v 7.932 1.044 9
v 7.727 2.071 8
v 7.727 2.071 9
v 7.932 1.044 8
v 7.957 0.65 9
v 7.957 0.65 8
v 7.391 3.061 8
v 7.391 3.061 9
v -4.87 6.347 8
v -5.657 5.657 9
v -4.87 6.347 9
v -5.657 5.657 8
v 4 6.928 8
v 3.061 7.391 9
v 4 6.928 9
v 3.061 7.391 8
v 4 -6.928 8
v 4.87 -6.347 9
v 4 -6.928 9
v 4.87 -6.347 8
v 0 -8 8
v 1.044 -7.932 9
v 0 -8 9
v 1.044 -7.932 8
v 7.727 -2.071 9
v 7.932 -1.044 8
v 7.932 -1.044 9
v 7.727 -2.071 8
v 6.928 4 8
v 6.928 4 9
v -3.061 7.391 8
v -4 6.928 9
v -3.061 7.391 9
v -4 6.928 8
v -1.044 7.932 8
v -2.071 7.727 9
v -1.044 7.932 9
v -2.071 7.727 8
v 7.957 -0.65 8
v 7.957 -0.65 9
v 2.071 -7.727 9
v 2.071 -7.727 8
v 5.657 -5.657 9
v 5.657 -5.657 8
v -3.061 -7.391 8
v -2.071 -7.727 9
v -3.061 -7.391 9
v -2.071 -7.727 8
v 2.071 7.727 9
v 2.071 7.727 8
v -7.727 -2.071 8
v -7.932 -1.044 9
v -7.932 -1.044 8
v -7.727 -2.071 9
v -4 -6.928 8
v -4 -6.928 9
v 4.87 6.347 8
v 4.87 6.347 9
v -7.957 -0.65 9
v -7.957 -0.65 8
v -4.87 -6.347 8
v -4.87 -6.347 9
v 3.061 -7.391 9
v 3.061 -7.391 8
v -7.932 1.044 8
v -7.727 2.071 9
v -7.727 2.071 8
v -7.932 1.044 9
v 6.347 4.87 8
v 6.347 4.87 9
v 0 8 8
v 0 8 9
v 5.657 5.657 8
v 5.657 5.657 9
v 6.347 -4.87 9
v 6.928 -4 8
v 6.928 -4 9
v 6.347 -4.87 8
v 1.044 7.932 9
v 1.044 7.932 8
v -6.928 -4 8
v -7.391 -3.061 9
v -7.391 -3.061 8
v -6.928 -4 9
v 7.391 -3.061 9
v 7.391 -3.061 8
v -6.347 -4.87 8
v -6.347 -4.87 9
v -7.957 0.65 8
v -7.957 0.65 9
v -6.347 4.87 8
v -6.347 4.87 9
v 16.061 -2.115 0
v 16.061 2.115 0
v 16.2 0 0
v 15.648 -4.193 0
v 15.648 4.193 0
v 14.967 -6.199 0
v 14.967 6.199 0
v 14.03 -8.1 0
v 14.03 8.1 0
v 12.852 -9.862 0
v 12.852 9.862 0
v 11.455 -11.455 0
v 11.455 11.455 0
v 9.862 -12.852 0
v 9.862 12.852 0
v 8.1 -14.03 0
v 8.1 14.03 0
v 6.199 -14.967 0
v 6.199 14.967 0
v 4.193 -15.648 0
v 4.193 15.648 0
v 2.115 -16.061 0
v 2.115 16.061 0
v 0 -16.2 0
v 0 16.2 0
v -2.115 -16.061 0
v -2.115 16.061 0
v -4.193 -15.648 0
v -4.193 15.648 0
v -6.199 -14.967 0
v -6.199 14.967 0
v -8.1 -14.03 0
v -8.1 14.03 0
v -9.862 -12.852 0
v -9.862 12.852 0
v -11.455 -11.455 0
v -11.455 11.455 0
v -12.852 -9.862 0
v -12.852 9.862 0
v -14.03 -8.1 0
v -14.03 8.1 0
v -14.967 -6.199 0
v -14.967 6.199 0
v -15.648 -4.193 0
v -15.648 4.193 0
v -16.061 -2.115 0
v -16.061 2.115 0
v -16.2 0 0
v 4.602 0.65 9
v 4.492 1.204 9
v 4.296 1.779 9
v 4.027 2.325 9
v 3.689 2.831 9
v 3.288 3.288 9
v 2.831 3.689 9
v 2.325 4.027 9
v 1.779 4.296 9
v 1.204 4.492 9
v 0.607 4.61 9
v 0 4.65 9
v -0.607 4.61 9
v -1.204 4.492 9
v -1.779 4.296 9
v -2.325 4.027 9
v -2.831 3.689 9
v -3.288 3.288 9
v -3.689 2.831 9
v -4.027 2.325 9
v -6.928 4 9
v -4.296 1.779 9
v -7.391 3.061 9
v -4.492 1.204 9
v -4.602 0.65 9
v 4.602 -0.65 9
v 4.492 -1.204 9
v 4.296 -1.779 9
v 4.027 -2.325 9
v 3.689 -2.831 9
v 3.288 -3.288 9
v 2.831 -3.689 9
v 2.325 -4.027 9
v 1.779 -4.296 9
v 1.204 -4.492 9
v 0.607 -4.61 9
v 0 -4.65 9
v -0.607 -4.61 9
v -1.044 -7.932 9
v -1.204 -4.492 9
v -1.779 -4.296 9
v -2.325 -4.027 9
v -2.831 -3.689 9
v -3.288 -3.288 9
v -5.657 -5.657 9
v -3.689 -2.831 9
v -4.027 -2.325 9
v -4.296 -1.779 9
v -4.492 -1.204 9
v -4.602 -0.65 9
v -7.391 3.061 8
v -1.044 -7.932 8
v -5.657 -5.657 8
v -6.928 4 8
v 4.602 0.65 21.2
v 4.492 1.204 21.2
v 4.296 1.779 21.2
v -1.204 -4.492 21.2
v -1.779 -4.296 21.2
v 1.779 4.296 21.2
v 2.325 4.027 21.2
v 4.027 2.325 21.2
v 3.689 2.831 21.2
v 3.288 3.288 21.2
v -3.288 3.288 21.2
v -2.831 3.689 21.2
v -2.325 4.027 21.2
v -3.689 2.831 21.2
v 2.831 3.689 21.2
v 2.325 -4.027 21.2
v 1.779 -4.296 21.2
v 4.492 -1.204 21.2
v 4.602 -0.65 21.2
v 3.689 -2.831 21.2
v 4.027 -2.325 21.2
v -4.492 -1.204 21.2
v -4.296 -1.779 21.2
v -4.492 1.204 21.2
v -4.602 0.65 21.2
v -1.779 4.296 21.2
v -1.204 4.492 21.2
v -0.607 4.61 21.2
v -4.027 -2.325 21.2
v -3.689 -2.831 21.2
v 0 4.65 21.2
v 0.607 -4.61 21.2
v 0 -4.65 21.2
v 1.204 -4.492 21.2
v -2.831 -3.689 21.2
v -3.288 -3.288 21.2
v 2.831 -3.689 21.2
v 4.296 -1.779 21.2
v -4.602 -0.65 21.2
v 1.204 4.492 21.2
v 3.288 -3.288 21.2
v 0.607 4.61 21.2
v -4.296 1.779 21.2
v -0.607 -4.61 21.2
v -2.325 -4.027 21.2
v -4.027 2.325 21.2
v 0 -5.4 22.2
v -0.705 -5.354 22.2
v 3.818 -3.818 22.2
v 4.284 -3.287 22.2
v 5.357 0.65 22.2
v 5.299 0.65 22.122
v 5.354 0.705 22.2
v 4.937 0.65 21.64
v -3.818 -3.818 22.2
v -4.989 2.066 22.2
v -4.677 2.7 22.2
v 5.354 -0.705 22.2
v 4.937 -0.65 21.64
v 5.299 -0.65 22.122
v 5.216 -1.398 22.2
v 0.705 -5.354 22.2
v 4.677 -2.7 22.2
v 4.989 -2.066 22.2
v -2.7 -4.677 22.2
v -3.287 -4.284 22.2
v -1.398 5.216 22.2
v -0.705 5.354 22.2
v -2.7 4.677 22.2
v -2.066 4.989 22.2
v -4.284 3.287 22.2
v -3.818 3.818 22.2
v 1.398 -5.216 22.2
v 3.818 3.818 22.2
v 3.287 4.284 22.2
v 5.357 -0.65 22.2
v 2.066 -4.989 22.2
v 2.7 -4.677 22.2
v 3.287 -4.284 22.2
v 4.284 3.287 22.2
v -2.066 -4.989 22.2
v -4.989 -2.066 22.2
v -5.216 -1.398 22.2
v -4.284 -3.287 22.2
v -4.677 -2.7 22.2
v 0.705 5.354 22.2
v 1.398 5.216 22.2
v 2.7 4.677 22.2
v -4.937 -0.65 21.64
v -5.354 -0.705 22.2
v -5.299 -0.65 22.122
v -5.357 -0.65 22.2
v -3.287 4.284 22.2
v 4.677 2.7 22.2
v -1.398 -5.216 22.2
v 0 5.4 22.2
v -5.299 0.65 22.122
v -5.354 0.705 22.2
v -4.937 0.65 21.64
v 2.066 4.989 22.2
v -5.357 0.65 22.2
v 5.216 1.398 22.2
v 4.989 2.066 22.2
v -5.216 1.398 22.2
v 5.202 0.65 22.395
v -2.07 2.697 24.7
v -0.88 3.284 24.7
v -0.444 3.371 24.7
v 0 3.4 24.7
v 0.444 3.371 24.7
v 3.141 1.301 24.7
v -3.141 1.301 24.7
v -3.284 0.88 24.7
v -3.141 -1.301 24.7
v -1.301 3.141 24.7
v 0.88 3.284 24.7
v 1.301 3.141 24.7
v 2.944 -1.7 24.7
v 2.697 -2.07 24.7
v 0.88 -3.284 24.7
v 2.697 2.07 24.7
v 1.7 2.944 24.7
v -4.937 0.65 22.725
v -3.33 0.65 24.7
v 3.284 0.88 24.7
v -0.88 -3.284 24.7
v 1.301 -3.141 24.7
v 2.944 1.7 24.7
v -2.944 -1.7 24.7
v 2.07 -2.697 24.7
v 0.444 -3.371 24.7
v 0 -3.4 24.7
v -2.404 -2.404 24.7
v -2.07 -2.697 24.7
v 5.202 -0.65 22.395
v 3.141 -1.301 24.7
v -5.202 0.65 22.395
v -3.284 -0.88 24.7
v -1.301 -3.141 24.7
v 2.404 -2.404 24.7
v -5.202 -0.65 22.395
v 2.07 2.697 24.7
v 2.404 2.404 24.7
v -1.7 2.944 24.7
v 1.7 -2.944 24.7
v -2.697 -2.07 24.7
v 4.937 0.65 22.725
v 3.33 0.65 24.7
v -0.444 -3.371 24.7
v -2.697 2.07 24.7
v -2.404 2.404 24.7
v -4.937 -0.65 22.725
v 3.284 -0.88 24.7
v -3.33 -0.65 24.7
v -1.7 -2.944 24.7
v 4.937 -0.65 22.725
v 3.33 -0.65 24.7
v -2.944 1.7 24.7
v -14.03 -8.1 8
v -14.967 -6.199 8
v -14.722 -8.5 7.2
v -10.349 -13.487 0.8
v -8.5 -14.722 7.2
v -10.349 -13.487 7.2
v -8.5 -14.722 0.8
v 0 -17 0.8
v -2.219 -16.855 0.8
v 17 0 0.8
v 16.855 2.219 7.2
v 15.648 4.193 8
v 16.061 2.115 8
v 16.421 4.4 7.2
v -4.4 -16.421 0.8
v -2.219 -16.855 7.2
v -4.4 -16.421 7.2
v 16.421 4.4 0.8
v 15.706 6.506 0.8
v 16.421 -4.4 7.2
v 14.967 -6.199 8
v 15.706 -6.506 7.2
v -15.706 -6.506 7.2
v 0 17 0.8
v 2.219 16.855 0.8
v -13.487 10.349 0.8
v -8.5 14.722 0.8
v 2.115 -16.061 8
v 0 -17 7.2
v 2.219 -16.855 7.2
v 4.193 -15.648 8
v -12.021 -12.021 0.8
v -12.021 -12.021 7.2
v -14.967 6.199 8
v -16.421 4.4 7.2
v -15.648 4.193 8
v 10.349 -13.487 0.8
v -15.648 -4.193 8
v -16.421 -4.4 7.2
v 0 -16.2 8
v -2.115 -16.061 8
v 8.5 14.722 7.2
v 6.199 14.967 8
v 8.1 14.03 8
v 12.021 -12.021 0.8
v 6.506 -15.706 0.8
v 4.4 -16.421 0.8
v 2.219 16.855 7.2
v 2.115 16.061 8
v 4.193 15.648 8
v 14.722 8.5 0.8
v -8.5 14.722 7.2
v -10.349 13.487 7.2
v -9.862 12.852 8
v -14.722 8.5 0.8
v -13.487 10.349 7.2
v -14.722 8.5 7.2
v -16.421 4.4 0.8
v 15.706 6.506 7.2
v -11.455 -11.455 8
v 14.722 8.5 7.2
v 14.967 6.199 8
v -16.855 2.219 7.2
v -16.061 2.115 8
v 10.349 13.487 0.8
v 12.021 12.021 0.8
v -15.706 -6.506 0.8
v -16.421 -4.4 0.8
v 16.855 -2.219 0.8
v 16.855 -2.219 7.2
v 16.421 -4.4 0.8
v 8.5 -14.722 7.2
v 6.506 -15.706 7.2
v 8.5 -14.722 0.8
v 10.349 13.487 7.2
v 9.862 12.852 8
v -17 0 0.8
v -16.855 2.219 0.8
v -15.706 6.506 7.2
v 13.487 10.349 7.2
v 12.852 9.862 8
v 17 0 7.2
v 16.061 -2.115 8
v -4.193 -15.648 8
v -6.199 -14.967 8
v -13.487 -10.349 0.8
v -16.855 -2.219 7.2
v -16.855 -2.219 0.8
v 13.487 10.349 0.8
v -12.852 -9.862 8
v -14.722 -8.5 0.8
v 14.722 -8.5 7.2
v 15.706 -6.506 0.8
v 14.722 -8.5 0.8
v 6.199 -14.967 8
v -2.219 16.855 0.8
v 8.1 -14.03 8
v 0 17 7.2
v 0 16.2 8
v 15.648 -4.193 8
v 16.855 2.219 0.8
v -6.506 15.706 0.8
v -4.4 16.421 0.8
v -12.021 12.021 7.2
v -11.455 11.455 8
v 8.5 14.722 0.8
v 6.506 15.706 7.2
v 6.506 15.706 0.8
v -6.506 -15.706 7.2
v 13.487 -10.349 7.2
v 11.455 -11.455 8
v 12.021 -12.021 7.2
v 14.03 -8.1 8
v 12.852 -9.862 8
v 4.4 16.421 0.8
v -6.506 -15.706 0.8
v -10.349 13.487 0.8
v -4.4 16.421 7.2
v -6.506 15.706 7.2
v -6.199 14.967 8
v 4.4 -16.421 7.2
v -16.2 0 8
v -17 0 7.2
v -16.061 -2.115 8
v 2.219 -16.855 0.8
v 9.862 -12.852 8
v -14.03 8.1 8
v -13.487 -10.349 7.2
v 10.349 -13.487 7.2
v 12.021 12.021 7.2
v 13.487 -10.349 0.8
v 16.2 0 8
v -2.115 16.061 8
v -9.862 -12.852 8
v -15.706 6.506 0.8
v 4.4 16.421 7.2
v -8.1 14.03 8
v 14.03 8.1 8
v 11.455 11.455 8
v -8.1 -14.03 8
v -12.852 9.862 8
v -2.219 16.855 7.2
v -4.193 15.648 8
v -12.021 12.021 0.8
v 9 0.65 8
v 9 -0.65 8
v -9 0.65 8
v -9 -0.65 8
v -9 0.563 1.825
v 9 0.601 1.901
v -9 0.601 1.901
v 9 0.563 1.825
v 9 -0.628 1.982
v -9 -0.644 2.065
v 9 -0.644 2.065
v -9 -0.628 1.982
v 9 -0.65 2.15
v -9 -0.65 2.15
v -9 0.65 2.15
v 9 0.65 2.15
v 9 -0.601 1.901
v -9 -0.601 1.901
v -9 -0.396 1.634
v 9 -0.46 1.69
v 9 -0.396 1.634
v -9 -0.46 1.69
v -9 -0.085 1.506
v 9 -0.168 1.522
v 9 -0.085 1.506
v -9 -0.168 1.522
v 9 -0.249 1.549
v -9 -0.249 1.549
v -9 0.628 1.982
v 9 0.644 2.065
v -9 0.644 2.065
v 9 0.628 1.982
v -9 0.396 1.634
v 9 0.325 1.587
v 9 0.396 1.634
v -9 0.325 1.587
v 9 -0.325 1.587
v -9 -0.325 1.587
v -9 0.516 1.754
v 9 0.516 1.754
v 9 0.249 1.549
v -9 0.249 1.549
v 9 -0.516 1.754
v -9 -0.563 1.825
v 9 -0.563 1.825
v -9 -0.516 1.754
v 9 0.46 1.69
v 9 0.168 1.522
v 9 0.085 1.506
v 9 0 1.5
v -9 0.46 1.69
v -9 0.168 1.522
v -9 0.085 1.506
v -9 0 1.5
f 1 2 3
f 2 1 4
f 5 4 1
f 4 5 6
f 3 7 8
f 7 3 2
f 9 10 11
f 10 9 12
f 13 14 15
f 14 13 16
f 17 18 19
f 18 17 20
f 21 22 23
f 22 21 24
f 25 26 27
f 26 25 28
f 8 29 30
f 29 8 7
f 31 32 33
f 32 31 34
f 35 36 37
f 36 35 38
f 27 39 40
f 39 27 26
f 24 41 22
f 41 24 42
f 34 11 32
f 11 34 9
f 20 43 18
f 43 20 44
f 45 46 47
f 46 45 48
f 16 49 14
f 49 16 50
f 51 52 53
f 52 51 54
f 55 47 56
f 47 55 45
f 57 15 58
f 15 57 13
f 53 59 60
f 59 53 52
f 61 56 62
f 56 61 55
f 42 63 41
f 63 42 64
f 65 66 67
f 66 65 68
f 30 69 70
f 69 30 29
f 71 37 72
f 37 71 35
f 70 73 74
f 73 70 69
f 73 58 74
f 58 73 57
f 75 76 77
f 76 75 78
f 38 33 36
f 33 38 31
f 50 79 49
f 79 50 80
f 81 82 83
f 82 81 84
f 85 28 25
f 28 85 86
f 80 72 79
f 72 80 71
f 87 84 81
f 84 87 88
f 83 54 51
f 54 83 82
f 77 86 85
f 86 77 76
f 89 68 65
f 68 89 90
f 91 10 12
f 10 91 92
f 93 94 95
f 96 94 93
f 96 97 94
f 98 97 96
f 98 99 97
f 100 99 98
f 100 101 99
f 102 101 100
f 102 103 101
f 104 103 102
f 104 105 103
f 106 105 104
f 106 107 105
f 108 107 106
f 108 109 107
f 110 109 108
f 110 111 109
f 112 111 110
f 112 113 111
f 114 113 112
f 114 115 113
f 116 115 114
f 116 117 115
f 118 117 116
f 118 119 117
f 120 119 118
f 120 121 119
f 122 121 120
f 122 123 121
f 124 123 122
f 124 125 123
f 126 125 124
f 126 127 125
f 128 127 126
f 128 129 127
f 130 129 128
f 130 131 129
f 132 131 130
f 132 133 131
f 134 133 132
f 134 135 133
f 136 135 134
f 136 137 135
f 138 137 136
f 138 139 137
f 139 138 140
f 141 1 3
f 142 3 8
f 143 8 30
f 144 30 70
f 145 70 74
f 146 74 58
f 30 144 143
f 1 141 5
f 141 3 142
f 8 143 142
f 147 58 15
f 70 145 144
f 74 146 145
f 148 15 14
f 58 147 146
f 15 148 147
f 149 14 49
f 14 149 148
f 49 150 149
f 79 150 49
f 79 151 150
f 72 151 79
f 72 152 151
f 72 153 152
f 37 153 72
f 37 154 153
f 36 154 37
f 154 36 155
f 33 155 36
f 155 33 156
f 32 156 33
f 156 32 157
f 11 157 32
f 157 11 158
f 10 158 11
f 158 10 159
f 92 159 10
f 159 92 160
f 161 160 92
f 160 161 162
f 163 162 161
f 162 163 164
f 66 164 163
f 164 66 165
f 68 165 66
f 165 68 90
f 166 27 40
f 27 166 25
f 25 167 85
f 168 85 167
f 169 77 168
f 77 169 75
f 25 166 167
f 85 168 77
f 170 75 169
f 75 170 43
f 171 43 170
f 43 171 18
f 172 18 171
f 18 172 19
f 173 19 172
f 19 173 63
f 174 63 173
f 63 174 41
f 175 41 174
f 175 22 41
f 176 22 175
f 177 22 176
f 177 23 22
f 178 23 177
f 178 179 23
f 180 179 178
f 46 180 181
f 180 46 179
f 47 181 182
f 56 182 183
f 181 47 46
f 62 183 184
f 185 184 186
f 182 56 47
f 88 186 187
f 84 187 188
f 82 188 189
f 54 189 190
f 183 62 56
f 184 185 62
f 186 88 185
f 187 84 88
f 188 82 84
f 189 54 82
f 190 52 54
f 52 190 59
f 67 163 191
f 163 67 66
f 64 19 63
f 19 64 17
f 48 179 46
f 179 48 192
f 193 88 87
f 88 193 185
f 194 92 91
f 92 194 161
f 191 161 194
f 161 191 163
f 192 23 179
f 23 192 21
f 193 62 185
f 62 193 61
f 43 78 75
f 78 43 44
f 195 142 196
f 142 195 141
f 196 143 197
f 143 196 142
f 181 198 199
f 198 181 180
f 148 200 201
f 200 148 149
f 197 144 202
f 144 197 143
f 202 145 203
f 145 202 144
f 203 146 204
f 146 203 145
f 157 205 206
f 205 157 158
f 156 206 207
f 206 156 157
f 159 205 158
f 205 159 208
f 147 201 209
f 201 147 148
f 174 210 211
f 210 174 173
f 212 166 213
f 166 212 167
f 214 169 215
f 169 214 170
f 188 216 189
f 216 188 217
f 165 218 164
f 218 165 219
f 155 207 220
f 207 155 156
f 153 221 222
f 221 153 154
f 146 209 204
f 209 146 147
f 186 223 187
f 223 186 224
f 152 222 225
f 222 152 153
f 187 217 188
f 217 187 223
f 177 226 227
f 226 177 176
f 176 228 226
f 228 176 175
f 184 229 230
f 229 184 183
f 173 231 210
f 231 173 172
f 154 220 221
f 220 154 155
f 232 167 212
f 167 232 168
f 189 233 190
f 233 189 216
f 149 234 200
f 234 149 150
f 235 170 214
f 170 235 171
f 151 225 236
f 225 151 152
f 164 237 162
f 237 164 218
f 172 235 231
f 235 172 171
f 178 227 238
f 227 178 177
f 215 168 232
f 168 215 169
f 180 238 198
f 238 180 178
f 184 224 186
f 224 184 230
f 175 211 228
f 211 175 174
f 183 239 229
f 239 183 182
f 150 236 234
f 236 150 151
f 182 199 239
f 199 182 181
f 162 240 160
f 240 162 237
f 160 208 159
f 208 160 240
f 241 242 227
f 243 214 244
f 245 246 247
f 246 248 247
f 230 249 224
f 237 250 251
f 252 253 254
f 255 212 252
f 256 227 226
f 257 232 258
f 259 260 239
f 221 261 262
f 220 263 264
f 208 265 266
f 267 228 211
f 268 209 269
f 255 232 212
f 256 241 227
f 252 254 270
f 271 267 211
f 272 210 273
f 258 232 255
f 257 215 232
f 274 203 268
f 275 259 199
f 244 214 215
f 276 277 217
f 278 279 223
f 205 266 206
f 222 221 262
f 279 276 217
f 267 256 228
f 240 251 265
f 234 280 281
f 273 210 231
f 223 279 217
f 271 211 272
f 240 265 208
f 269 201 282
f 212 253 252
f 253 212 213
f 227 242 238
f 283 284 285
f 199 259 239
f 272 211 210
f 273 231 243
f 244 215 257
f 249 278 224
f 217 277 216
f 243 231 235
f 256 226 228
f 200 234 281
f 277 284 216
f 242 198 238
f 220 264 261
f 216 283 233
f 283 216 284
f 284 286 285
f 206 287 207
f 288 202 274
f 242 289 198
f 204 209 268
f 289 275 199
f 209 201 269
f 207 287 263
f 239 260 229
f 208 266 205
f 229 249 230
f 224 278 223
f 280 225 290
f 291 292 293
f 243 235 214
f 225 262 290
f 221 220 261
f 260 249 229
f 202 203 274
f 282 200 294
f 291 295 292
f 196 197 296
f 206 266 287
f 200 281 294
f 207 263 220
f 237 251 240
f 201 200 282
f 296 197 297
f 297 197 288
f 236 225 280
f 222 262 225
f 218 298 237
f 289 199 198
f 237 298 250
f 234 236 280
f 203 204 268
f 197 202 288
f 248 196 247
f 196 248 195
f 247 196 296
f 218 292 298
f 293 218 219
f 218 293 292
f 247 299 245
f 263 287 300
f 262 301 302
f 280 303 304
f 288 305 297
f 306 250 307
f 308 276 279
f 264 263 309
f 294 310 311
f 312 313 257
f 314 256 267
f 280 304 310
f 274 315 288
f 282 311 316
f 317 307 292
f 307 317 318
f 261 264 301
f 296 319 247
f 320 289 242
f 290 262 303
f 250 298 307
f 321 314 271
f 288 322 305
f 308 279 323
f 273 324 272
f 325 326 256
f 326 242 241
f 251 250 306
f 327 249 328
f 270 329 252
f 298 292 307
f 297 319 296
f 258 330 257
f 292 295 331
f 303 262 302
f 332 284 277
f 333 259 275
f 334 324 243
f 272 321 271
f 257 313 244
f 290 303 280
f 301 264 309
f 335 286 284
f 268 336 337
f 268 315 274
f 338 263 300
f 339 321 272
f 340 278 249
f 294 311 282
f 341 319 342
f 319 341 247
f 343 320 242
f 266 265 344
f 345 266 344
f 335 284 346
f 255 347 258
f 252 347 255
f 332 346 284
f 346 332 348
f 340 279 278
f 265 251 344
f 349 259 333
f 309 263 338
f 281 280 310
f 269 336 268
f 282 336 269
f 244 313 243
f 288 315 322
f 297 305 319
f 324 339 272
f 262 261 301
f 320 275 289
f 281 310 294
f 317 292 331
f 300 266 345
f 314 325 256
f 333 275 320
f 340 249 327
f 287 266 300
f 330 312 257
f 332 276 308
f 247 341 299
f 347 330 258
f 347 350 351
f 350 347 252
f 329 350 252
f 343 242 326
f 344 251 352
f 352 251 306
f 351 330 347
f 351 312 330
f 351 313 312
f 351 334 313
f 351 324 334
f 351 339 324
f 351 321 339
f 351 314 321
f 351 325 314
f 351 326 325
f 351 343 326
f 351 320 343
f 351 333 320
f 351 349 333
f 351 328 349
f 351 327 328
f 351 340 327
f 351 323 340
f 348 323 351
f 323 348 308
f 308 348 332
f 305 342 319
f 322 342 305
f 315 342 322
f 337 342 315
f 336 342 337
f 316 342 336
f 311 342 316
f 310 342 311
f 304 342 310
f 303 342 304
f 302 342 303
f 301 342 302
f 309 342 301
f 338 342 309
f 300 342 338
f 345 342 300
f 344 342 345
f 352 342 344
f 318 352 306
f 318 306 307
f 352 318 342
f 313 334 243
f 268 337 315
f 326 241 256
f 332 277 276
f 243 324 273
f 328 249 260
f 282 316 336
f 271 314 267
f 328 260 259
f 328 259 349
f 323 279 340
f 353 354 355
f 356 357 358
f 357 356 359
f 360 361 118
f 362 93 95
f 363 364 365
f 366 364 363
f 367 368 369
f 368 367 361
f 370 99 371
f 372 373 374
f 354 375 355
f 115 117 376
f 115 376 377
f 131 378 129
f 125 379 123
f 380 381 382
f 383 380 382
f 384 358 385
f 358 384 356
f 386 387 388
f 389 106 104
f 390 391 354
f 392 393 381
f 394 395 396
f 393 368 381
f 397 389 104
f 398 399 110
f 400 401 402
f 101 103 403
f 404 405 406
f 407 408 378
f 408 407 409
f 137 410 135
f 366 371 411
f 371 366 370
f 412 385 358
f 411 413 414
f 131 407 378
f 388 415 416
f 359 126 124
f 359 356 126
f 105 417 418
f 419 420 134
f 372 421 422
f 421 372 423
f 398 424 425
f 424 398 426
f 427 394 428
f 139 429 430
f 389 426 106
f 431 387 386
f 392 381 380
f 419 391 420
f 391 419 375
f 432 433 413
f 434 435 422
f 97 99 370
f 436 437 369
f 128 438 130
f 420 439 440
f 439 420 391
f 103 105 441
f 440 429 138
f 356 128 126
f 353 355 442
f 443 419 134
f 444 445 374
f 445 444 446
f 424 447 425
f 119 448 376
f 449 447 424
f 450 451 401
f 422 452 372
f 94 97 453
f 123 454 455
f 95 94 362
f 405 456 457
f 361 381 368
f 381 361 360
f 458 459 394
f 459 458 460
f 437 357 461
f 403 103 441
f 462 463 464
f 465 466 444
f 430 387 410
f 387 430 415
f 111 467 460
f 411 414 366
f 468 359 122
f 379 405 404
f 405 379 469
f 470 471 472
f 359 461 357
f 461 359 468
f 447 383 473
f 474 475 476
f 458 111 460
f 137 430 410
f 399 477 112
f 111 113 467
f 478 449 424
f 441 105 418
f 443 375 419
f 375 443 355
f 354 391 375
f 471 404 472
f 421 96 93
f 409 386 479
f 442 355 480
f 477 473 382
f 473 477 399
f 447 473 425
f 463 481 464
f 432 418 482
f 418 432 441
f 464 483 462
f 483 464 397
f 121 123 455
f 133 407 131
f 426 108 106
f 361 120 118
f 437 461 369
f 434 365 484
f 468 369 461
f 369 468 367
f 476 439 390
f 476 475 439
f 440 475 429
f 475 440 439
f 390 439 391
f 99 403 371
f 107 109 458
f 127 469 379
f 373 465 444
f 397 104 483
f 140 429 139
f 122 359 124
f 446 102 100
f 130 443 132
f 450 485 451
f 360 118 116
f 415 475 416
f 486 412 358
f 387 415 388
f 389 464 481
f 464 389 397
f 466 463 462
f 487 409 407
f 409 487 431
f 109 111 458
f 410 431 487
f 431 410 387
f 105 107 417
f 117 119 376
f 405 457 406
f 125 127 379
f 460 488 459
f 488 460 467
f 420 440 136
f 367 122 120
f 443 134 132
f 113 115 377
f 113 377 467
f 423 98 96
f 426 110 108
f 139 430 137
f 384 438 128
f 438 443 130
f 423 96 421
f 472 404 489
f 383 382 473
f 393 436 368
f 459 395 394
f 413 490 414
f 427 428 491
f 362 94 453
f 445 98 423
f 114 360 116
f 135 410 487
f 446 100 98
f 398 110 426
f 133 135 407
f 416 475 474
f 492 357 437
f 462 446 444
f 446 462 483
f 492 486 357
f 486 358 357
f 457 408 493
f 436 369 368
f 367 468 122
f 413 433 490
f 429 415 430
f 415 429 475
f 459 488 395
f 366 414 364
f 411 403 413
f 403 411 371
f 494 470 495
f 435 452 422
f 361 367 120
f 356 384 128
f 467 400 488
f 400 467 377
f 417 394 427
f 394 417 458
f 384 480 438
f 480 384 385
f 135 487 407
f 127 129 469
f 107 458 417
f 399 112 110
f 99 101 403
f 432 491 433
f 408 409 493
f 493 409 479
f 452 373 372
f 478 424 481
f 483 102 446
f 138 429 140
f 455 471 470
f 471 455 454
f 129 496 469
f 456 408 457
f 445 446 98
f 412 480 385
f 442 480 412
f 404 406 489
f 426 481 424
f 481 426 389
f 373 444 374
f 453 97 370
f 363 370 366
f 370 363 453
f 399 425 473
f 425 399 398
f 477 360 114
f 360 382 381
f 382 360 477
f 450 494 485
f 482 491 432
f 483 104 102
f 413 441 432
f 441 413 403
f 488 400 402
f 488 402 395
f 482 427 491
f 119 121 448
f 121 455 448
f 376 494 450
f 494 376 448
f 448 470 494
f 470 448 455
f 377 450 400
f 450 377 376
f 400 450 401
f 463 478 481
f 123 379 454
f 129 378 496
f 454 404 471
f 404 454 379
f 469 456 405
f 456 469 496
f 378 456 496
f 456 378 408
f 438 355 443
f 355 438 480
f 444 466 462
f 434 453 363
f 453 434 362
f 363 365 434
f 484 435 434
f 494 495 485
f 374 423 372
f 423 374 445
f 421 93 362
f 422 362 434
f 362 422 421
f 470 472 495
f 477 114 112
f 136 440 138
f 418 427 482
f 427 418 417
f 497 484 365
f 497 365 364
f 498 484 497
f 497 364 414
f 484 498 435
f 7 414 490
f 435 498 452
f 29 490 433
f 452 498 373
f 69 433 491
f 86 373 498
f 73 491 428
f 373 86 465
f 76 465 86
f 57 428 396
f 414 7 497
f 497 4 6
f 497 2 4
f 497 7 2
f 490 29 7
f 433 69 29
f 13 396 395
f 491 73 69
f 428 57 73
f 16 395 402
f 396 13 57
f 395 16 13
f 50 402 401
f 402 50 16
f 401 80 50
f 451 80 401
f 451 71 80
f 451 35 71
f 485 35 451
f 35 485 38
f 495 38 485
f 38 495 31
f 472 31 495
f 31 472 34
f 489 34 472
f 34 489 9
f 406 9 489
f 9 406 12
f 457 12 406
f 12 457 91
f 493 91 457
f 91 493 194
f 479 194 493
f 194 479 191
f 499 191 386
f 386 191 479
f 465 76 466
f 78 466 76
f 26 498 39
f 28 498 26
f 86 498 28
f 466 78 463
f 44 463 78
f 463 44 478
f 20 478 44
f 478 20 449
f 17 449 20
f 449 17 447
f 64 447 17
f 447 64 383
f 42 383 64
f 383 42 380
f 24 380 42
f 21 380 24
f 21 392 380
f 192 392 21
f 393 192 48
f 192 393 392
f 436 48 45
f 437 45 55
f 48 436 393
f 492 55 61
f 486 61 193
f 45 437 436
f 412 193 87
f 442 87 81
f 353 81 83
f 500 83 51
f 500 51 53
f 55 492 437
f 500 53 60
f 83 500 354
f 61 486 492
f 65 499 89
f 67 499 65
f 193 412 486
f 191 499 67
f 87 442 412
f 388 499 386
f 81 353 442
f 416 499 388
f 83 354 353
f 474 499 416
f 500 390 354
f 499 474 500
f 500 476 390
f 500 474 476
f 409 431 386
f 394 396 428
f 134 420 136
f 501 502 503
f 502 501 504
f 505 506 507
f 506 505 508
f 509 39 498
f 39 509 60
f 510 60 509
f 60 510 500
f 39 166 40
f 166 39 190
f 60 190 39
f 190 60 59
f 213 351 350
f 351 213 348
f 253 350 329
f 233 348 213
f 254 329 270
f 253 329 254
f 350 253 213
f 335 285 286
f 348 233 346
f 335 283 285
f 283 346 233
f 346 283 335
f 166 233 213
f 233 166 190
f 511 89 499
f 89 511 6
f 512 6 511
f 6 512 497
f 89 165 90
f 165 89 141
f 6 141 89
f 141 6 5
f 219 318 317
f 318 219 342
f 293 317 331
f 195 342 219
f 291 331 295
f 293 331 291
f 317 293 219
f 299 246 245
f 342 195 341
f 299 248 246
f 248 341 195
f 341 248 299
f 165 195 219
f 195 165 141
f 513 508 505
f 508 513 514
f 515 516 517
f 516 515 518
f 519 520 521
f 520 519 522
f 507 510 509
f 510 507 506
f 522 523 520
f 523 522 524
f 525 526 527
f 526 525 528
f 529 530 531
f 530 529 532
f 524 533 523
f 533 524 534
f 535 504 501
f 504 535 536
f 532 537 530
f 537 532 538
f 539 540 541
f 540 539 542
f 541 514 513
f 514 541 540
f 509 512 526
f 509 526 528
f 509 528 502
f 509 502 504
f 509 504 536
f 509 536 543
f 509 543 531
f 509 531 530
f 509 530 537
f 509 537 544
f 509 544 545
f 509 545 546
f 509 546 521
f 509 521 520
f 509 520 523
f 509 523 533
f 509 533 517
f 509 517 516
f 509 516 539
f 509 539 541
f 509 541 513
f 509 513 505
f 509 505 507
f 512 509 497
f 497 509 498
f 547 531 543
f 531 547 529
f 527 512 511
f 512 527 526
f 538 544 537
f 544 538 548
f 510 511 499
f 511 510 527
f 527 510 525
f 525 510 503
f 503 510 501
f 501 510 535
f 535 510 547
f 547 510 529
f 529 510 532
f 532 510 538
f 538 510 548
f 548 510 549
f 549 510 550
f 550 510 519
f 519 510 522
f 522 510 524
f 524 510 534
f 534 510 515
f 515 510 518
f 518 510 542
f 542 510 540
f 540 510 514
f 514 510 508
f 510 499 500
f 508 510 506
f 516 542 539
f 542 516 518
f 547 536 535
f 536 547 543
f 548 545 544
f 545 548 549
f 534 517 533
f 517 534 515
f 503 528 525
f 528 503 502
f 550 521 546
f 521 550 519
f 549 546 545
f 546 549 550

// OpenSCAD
// wheel — one road wheel. Four per platform.
//
// It prints lying on its outer face with the snap peg pointing straight up,
// which is the whole reason the peg lives on the wheel rather than on the
// chassis: every surface of the joint is then either a vertical wall or an
// upward-facing taper, and the one downward face (the retaining shoulder) is a
// 37 deg cone. Nothing here needs support.
//
// Push it into the platform's flank until it clicks. It turns on the peg shaft
// inside the platform's 12 mm journal.
//
// Every dimension lives in ../../lib/common.scad.

include <../../lib/common.scad>

// Peg stations, measured up from the outer face (the print bed).
boss_top   = wheel_w + wheel_boss_h;
// The shaft has to span what is left of the side clearance plus the full wall.
shaft_top  = boss_top + (wheel_gap - wheel_boss_h) + axle_neck_l;
retain_top = shaft_top + axle_retain_h;
peg_top    = retain_top + axle_lead_h;

// ---------------------------------------------------------------------------

// The road wheel itself: a barrel with both rim edges broken. The lower break
// is a 45 deg ramp growing straight off the plate.
module disc() {
    hull() {
        cylinder(h = 0.01, d = wheel_dia - 2*wheel_cham);
        translate([0, 0, wheel_cham])
            cylinder(h = wheel_w - 2*wheel_cham, d = wheel_dia);
        translate([0, 0, wheel_w - 0.01])
            cylinder(h = 0.01, d = wheel_dia - 2*wheel_cham);
    }
}

// The snap peg. Read bottom to top: a boss that carries the rubbing face, the
// shaft the wheel turns on, the retaining cone that catches behind the wall,
// and a long shallow ramp that is what makes it easy to push in.
module peg() {
    // rubbing boss — the wheel rides on a 16 mm ring rather than its whole
    // 34 mm face, and the ring has to land OUTSIDE the socket's flared mouth
    cylinder(h = boss_top, d = wheel_boss_d);
    cylinder(h = shaft_top, d = axle_d);
    translate([0, 0, shaft_top])
        cylinder(h = axle_retain_h, d1 = axle_d, d2 = axle_barb_d);
    translate([0, 0, retain_top])
        cylinder(h = axle_lead_h, d1 = axle_barb_d, d2 = axle_tip_d);
}

// The slit that lets the barb through a hole smaller than itself.
//
// Two things about it are load-bearing, both learned from a broken print:
//
//   * Its FLOOR is rounded, not square. A square-cornered slit bottom is a
//     stress riser sitting exactly where the finger is most highly stressed,
//     in a direction (across the print layers) where PLA is brittle. This is
//     where the first version failed.
//   * It runs from well down inside the disc, because the fingers' length is
//     what keeps the strain low — and it must be longer than the BOSS is wide,
//     or a hair-thin web of boss bridges the two fingers and stiffens the snap.
module slit() {
    len = wheel_boss_d + 2;
    hull() {
        translate([0, 0, axle_slot_z + axle_slot_r])
            rotate([0, 90, 0])
                cylinder(h = len, r = axle_slot_r, center = true);
        translate([0, 0, peg_top + 1])
            cube([len, axle_slot_w, 0.01], center = true);
    }
}

module wheel() {
    difference() {
        union() {
            disc();
            peg();
        }
        slit();
    }
}

wheel();
